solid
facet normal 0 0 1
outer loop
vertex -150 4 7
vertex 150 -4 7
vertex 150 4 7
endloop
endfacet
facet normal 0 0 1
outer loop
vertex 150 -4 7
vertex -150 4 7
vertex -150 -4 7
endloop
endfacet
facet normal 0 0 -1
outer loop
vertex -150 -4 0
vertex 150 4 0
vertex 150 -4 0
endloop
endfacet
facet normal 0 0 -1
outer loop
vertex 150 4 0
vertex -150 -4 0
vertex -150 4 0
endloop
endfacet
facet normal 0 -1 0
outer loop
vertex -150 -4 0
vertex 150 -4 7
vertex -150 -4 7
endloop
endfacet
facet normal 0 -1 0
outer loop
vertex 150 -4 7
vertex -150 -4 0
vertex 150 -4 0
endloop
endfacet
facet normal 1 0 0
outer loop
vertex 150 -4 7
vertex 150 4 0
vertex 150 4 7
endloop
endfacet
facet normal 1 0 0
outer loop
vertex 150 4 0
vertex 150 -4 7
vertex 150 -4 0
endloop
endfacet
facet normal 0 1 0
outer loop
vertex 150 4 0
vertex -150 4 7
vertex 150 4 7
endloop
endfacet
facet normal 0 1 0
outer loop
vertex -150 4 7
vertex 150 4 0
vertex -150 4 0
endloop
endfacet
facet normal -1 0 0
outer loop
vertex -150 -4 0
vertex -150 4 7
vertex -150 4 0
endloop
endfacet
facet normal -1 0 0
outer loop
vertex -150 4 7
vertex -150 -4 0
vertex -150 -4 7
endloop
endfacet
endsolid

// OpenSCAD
// === RECTANGULAR PIN PARAMETERS ===
pin_length = 300;
pin_width = 8;
pin_height = 7;

// Center it on X/Y and sit on Z=0
translate([-pin_length/2, -pin_width/2, 0])
    cube([pin_length, pin_width, pin_height], center = false);
